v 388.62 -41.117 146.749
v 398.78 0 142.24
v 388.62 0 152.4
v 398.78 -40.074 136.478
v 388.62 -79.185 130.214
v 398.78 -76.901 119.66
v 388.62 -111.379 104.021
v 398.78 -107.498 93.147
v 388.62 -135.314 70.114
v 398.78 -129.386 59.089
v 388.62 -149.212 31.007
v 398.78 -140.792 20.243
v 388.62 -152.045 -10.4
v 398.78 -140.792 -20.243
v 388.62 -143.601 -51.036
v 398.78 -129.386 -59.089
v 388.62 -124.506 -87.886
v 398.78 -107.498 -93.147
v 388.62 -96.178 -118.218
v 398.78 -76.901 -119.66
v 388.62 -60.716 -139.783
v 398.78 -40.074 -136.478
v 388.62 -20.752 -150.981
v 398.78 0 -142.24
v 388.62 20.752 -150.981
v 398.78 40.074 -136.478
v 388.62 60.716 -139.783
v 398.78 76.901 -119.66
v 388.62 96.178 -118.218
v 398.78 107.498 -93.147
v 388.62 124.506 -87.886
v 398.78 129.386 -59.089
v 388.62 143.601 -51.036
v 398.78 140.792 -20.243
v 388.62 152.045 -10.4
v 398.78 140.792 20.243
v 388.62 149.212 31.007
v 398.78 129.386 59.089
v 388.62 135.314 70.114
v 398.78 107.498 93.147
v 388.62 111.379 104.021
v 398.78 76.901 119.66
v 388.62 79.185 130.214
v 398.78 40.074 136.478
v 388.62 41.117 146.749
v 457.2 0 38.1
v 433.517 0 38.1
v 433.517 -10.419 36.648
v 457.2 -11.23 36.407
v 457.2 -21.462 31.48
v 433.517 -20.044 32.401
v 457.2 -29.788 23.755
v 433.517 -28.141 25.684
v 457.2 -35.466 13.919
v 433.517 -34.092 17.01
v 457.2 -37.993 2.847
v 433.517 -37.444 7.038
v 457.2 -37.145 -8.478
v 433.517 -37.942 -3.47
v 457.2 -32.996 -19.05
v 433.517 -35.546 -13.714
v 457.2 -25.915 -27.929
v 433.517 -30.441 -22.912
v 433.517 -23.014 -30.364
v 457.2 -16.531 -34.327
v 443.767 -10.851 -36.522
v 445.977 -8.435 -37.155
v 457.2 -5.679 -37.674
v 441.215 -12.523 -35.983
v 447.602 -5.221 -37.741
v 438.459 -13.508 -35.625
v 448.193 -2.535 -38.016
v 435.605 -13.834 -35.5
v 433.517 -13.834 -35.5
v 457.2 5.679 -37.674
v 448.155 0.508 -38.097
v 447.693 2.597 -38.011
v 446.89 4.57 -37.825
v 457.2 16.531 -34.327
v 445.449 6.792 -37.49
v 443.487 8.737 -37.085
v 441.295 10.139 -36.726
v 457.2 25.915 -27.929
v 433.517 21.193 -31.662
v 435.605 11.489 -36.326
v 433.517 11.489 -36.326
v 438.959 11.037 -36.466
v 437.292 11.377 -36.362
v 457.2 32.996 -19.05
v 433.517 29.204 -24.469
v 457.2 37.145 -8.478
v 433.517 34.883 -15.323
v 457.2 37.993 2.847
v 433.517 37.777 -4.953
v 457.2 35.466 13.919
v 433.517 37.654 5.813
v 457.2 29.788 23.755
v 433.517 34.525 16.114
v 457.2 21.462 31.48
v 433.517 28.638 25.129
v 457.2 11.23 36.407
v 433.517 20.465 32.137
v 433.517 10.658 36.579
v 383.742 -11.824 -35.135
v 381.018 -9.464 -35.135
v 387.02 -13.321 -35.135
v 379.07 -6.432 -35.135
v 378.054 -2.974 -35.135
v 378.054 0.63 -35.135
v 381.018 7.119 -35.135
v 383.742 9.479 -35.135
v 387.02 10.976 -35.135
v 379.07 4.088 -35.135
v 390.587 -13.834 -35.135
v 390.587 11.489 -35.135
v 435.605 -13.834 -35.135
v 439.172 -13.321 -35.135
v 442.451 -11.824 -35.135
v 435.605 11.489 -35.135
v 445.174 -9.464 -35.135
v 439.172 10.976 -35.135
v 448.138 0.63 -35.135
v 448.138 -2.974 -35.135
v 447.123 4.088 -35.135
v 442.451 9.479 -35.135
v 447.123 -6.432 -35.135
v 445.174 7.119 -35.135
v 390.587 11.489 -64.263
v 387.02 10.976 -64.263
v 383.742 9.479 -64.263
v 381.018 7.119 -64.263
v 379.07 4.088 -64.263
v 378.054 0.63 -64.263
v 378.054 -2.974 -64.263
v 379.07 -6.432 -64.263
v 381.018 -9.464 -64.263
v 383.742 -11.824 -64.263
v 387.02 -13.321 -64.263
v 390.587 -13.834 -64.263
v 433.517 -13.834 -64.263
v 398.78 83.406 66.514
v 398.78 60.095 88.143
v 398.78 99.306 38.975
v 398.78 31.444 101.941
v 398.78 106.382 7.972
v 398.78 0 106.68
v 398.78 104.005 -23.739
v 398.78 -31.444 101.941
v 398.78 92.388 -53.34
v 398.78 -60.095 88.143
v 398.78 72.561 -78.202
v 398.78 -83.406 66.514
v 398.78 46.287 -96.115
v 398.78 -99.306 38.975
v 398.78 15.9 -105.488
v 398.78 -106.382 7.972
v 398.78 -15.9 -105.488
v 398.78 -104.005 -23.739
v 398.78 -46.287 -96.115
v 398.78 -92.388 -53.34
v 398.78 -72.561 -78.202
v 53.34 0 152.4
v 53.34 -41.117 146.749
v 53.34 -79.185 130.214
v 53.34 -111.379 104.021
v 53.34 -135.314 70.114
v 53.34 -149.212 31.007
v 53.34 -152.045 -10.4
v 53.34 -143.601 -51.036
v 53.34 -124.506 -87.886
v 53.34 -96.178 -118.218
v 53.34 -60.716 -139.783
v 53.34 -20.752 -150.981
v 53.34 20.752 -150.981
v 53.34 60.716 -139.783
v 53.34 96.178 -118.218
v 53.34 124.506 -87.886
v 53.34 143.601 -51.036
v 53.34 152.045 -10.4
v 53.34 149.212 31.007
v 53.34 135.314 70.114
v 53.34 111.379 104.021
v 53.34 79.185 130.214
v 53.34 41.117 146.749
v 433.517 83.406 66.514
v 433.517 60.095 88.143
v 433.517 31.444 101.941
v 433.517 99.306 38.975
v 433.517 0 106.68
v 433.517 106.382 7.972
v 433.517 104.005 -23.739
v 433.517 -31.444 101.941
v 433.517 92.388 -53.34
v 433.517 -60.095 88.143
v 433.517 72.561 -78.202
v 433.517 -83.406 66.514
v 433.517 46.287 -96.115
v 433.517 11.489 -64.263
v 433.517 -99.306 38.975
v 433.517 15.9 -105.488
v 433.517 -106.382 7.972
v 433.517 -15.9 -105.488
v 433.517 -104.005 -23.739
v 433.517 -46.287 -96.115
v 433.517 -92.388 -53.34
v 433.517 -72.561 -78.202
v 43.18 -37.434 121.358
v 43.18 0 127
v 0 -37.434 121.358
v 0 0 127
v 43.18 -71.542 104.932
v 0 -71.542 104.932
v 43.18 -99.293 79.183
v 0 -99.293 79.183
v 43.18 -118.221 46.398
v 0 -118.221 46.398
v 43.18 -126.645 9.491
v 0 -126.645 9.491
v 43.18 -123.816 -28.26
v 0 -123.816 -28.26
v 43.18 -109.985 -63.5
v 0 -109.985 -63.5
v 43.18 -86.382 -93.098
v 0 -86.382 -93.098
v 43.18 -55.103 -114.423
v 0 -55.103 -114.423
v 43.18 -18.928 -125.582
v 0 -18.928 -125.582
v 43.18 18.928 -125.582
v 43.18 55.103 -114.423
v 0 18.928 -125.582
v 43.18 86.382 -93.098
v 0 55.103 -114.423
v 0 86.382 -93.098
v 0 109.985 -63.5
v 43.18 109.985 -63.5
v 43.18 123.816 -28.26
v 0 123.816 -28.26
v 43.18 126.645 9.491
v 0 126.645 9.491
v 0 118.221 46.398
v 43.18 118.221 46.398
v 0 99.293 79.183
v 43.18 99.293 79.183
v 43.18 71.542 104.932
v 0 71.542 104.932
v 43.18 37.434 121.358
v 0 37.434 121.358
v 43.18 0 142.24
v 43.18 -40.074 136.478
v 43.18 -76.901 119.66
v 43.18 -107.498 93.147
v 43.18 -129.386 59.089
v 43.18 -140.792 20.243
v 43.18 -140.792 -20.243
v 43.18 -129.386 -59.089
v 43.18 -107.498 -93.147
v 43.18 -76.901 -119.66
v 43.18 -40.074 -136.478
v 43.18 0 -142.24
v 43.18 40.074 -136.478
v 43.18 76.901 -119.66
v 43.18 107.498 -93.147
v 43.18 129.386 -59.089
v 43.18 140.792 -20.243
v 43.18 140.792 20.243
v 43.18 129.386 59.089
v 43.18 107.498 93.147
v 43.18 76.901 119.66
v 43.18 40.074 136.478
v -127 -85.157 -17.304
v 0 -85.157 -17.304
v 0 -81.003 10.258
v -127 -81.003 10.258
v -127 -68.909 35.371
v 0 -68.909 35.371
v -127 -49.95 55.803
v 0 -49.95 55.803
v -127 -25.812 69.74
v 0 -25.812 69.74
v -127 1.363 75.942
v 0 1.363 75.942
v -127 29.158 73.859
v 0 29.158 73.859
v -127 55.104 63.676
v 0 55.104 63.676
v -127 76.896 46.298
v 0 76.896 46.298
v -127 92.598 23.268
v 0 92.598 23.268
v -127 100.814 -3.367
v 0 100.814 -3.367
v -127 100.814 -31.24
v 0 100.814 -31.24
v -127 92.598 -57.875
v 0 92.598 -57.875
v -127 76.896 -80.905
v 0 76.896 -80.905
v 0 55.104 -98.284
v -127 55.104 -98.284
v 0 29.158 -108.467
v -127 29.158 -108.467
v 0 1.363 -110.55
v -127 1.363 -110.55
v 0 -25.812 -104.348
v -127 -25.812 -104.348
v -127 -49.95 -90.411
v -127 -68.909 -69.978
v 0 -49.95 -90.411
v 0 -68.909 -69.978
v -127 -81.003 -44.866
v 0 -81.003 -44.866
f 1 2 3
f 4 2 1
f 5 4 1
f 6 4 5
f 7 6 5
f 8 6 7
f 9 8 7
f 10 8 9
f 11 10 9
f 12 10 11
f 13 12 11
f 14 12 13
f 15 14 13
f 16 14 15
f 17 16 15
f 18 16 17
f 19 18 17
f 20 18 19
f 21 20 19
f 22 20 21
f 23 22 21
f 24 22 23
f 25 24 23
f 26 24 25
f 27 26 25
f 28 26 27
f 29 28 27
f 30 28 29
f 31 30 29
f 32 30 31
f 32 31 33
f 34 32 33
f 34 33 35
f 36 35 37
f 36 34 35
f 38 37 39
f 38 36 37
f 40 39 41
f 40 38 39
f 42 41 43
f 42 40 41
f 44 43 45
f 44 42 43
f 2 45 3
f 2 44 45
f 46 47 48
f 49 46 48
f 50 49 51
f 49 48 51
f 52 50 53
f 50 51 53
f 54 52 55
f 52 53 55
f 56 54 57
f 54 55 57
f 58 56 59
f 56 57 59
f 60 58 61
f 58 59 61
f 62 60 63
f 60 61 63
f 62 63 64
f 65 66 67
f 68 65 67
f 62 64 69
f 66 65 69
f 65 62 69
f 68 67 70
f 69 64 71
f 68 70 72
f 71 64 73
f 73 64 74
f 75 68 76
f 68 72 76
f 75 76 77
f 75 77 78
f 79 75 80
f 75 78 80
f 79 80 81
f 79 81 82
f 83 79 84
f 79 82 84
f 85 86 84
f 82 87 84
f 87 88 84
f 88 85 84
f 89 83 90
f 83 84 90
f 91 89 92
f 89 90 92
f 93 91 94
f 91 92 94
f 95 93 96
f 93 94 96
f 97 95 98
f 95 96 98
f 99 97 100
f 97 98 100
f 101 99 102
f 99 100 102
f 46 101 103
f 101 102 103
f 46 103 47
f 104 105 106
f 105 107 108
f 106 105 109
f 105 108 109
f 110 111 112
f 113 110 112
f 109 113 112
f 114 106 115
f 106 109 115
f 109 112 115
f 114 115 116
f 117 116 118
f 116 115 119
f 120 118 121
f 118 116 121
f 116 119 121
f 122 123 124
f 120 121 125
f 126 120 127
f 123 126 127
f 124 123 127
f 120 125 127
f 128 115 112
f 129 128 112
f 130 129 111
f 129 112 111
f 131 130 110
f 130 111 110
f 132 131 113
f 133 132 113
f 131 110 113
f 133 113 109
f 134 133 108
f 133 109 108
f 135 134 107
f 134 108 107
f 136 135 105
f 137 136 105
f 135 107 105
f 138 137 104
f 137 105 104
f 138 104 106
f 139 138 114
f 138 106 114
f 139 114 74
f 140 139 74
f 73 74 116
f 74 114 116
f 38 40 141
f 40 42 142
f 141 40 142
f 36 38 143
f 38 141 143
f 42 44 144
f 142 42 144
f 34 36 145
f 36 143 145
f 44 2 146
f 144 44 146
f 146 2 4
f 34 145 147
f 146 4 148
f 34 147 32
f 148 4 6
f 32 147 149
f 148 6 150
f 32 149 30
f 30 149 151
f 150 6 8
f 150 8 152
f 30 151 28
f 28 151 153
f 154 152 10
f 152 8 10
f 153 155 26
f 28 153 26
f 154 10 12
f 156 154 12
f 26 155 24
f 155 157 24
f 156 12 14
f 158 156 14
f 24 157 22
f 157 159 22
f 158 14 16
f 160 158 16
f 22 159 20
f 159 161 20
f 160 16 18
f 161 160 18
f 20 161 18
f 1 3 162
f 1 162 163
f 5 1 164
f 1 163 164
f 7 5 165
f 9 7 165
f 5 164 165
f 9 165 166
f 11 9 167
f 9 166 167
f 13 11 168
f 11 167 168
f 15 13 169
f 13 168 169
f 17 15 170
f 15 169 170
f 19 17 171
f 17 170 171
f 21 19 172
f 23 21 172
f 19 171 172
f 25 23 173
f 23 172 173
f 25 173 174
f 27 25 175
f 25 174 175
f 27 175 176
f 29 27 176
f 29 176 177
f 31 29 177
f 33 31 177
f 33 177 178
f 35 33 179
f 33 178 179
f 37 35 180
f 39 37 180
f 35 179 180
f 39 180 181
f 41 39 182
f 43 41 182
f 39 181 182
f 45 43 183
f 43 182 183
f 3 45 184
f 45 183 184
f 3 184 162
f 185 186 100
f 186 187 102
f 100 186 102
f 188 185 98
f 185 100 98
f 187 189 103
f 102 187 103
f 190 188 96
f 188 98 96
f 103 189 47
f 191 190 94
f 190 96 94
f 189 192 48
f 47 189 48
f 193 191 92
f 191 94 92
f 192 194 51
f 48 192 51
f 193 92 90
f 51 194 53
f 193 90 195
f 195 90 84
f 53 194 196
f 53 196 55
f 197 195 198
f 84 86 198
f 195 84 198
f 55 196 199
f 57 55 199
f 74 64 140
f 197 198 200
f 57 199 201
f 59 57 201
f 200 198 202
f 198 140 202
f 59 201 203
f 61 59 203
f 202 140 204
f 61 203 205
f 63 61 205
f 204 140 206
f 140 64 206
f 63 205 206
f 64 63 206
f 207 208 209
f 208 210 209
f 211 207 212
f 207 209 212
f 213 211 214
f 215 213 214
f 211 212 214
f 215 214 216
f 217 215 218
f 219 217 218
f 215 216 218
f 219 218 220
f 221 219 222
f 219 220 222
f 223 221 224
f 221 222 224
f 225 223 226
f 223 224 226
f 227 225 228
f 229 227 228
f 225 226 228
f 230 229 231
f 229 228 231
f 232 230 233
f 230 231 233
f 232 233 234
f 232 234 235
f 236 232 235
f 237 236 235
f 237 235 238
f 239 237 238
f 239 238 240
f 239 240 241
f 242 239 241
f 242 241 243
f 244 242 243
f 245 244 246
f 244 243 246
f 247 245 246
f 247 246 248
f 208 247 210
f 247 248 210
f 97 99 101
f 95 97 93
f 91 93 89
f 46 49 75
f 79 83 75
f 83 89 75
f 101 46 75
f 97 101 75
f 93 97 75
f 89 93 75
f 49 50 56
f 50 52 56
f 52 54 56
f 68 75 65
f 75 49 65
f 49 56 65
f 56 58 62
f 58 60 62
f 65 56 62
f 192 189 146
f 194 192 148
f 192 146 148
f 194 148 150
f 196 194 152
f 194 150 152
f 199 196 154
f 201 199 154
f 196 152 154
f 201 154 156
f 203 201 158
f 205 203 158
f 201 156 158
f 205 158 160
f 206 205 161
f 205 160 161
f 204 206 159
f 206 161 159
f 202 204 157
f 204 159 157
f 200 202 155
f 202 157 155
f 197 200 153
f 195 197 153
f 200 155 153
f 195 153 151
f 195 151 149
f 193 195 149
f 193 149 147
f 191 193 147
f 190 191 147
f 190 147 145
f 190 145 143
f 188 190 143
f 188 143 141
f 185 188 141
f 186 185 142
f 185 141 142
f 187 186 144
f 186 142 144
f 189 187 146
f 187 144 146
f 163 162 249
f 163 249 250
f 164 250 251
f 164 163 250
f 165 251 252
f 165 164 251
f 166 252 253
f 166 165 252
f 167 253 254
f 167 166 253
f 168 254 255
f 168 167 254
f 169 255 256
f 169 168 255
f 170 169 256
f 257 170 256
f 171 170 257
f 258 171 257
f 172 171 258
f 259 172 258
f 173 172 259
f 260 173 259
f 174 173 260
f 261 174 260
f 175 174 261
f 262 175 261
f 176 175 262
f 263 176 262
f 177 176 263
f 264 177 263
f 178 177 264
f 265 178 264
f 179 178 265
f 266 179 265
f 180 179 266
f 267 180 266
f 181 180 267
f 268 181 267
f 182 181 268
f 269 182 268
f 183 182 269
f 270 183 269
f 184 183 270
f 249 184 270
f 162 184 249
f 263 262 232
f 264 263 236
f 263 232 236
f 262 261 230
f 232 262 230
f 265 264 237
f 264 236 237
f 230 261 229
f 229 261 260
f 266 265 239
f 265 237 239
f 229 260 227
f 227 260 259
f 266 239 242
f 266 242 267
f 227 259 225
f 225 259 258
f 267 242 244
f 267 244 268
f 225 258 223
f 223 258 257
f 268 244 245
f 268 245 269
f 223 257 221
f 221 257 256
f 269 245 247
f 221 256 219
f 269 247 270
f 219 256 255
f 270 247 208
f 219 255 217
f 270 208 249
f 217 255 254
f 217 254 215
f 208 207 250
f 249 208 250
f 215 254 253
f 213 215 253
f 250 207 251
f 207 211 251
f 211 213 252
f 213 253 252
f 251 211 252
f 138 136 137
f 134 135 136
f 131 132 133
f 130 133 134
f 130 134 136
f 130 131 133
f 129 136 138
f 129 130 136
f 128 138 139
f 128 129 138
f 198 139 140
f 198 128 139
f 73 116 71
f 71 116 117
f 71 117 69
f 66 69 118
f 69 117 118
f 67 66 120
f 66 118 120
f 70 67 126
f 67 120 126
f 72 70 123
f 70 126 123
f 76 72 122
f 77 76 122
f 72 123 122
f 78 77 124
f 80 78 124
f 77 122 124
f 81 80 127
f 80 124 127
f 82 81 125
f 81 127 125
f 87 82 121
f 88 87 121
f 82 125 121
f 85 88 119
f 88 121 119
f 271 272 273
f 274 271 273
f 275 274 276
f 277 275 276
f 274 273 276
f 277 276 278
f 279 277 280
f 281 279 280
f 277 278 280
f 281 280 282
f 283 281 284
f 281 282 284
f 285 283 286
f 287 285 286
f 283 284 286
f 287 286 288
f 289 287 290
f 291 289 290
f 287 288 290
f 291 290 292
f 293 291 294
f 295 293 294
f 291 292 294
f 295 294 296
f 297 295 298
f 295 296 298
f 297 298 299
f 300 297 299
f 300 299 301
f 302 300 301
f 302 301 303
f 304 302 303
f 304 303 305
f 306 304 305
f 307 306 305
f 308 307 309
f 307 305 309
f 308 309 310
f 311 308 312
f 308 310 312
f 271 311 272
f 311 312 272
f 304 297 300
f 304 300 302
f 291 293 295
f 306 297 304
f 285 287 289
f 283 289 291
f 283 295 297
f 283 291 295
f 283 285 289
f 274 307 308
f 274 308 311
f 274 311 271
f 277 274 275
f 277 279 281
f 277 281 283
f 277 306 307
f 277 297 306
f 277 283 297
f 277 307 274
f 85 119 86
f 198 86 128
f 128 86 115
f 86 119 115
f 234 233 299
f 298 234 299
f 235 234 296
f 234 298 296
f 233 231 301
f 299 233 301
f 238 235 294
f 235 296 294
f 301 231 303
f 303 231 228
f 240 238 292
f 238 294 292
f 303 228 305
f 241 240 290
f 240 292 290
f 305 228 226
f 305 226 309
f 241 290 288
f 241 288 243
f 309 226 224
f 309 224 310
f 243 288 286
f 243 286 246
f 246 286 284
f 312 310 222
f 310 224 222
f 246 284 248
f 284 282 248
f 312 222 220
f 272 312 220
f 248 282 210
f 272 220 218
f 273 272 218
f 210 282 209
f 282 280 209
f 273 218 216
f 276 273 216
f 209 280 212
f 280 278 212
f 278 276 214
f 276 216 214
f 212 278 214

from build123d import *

# Parameters (mm, degrees)
F3_START = -35.13478
F3_DEPTH = 29.12792
F4_SIZE  = 10.16
F5_R     = 93.5075941329
F6_DEPTH = 127


with BuildPart() as f1:
    # F0 (on Front) → F1 (revolve)
    with BuildSketch(Plane.XZ):
        Polygon((0, 127), (0, 0), (457.2, 0), (457.2, 38.1), (433.5165438938, 38.1), (433.5165438938, 106.68), (398.78, 106.68), (398.78, 152.4), (43.18, 152.4), (43.18, 127), align=None)
    revolve(axis=Axis((228.6, 0, 0), (1, 0, 0)))

    # F2 (on Top) → F3 (cut)
    with BuildSketch(Plane.XY.offset(F3_START)):
        with BuildLine():
            Line((435.6053211212, 11.4893475547), (390.5868865967, 11.4893475547))
            ThreePointArc((390.5868865967, 11.4893475547), (377.9254574746, -1.1720815673), (390.5868865967, -13.8335106894))
            Line((390.5868865967, -13.8335106894), (435.6053211212, -13.8335106894))
            ThreePointArc((435.6053211212, -13.8335106894), (448.2667502433, -1.1720815673), (435.6053211212, 11.4893475547))
        make_face()
    extrude(amount=-F3_DEPTH, mode=Mode.SUBTRACT)

    # F4
    f4_edges = [f1.edges().sort_by_distance(p)[0] for p in [
        (43.18, 0, -152.4),
        (398.78, 0, -152.4),
    ]]
    chamfer(f4_edges, length=F4_SIZE)

    # F5 (on face) → F6 (join)
    with BuildSketch(Plane(origin=(0, 0, 0), x_dir=(0, -1, 0), z_dir=(-1, 0, 0))):
        with Locations((-8.3505315706, -17.3037741333)):
            Circle(F5_R)
    extrude(amount=F6_DEPTH)


solid = f1.part
